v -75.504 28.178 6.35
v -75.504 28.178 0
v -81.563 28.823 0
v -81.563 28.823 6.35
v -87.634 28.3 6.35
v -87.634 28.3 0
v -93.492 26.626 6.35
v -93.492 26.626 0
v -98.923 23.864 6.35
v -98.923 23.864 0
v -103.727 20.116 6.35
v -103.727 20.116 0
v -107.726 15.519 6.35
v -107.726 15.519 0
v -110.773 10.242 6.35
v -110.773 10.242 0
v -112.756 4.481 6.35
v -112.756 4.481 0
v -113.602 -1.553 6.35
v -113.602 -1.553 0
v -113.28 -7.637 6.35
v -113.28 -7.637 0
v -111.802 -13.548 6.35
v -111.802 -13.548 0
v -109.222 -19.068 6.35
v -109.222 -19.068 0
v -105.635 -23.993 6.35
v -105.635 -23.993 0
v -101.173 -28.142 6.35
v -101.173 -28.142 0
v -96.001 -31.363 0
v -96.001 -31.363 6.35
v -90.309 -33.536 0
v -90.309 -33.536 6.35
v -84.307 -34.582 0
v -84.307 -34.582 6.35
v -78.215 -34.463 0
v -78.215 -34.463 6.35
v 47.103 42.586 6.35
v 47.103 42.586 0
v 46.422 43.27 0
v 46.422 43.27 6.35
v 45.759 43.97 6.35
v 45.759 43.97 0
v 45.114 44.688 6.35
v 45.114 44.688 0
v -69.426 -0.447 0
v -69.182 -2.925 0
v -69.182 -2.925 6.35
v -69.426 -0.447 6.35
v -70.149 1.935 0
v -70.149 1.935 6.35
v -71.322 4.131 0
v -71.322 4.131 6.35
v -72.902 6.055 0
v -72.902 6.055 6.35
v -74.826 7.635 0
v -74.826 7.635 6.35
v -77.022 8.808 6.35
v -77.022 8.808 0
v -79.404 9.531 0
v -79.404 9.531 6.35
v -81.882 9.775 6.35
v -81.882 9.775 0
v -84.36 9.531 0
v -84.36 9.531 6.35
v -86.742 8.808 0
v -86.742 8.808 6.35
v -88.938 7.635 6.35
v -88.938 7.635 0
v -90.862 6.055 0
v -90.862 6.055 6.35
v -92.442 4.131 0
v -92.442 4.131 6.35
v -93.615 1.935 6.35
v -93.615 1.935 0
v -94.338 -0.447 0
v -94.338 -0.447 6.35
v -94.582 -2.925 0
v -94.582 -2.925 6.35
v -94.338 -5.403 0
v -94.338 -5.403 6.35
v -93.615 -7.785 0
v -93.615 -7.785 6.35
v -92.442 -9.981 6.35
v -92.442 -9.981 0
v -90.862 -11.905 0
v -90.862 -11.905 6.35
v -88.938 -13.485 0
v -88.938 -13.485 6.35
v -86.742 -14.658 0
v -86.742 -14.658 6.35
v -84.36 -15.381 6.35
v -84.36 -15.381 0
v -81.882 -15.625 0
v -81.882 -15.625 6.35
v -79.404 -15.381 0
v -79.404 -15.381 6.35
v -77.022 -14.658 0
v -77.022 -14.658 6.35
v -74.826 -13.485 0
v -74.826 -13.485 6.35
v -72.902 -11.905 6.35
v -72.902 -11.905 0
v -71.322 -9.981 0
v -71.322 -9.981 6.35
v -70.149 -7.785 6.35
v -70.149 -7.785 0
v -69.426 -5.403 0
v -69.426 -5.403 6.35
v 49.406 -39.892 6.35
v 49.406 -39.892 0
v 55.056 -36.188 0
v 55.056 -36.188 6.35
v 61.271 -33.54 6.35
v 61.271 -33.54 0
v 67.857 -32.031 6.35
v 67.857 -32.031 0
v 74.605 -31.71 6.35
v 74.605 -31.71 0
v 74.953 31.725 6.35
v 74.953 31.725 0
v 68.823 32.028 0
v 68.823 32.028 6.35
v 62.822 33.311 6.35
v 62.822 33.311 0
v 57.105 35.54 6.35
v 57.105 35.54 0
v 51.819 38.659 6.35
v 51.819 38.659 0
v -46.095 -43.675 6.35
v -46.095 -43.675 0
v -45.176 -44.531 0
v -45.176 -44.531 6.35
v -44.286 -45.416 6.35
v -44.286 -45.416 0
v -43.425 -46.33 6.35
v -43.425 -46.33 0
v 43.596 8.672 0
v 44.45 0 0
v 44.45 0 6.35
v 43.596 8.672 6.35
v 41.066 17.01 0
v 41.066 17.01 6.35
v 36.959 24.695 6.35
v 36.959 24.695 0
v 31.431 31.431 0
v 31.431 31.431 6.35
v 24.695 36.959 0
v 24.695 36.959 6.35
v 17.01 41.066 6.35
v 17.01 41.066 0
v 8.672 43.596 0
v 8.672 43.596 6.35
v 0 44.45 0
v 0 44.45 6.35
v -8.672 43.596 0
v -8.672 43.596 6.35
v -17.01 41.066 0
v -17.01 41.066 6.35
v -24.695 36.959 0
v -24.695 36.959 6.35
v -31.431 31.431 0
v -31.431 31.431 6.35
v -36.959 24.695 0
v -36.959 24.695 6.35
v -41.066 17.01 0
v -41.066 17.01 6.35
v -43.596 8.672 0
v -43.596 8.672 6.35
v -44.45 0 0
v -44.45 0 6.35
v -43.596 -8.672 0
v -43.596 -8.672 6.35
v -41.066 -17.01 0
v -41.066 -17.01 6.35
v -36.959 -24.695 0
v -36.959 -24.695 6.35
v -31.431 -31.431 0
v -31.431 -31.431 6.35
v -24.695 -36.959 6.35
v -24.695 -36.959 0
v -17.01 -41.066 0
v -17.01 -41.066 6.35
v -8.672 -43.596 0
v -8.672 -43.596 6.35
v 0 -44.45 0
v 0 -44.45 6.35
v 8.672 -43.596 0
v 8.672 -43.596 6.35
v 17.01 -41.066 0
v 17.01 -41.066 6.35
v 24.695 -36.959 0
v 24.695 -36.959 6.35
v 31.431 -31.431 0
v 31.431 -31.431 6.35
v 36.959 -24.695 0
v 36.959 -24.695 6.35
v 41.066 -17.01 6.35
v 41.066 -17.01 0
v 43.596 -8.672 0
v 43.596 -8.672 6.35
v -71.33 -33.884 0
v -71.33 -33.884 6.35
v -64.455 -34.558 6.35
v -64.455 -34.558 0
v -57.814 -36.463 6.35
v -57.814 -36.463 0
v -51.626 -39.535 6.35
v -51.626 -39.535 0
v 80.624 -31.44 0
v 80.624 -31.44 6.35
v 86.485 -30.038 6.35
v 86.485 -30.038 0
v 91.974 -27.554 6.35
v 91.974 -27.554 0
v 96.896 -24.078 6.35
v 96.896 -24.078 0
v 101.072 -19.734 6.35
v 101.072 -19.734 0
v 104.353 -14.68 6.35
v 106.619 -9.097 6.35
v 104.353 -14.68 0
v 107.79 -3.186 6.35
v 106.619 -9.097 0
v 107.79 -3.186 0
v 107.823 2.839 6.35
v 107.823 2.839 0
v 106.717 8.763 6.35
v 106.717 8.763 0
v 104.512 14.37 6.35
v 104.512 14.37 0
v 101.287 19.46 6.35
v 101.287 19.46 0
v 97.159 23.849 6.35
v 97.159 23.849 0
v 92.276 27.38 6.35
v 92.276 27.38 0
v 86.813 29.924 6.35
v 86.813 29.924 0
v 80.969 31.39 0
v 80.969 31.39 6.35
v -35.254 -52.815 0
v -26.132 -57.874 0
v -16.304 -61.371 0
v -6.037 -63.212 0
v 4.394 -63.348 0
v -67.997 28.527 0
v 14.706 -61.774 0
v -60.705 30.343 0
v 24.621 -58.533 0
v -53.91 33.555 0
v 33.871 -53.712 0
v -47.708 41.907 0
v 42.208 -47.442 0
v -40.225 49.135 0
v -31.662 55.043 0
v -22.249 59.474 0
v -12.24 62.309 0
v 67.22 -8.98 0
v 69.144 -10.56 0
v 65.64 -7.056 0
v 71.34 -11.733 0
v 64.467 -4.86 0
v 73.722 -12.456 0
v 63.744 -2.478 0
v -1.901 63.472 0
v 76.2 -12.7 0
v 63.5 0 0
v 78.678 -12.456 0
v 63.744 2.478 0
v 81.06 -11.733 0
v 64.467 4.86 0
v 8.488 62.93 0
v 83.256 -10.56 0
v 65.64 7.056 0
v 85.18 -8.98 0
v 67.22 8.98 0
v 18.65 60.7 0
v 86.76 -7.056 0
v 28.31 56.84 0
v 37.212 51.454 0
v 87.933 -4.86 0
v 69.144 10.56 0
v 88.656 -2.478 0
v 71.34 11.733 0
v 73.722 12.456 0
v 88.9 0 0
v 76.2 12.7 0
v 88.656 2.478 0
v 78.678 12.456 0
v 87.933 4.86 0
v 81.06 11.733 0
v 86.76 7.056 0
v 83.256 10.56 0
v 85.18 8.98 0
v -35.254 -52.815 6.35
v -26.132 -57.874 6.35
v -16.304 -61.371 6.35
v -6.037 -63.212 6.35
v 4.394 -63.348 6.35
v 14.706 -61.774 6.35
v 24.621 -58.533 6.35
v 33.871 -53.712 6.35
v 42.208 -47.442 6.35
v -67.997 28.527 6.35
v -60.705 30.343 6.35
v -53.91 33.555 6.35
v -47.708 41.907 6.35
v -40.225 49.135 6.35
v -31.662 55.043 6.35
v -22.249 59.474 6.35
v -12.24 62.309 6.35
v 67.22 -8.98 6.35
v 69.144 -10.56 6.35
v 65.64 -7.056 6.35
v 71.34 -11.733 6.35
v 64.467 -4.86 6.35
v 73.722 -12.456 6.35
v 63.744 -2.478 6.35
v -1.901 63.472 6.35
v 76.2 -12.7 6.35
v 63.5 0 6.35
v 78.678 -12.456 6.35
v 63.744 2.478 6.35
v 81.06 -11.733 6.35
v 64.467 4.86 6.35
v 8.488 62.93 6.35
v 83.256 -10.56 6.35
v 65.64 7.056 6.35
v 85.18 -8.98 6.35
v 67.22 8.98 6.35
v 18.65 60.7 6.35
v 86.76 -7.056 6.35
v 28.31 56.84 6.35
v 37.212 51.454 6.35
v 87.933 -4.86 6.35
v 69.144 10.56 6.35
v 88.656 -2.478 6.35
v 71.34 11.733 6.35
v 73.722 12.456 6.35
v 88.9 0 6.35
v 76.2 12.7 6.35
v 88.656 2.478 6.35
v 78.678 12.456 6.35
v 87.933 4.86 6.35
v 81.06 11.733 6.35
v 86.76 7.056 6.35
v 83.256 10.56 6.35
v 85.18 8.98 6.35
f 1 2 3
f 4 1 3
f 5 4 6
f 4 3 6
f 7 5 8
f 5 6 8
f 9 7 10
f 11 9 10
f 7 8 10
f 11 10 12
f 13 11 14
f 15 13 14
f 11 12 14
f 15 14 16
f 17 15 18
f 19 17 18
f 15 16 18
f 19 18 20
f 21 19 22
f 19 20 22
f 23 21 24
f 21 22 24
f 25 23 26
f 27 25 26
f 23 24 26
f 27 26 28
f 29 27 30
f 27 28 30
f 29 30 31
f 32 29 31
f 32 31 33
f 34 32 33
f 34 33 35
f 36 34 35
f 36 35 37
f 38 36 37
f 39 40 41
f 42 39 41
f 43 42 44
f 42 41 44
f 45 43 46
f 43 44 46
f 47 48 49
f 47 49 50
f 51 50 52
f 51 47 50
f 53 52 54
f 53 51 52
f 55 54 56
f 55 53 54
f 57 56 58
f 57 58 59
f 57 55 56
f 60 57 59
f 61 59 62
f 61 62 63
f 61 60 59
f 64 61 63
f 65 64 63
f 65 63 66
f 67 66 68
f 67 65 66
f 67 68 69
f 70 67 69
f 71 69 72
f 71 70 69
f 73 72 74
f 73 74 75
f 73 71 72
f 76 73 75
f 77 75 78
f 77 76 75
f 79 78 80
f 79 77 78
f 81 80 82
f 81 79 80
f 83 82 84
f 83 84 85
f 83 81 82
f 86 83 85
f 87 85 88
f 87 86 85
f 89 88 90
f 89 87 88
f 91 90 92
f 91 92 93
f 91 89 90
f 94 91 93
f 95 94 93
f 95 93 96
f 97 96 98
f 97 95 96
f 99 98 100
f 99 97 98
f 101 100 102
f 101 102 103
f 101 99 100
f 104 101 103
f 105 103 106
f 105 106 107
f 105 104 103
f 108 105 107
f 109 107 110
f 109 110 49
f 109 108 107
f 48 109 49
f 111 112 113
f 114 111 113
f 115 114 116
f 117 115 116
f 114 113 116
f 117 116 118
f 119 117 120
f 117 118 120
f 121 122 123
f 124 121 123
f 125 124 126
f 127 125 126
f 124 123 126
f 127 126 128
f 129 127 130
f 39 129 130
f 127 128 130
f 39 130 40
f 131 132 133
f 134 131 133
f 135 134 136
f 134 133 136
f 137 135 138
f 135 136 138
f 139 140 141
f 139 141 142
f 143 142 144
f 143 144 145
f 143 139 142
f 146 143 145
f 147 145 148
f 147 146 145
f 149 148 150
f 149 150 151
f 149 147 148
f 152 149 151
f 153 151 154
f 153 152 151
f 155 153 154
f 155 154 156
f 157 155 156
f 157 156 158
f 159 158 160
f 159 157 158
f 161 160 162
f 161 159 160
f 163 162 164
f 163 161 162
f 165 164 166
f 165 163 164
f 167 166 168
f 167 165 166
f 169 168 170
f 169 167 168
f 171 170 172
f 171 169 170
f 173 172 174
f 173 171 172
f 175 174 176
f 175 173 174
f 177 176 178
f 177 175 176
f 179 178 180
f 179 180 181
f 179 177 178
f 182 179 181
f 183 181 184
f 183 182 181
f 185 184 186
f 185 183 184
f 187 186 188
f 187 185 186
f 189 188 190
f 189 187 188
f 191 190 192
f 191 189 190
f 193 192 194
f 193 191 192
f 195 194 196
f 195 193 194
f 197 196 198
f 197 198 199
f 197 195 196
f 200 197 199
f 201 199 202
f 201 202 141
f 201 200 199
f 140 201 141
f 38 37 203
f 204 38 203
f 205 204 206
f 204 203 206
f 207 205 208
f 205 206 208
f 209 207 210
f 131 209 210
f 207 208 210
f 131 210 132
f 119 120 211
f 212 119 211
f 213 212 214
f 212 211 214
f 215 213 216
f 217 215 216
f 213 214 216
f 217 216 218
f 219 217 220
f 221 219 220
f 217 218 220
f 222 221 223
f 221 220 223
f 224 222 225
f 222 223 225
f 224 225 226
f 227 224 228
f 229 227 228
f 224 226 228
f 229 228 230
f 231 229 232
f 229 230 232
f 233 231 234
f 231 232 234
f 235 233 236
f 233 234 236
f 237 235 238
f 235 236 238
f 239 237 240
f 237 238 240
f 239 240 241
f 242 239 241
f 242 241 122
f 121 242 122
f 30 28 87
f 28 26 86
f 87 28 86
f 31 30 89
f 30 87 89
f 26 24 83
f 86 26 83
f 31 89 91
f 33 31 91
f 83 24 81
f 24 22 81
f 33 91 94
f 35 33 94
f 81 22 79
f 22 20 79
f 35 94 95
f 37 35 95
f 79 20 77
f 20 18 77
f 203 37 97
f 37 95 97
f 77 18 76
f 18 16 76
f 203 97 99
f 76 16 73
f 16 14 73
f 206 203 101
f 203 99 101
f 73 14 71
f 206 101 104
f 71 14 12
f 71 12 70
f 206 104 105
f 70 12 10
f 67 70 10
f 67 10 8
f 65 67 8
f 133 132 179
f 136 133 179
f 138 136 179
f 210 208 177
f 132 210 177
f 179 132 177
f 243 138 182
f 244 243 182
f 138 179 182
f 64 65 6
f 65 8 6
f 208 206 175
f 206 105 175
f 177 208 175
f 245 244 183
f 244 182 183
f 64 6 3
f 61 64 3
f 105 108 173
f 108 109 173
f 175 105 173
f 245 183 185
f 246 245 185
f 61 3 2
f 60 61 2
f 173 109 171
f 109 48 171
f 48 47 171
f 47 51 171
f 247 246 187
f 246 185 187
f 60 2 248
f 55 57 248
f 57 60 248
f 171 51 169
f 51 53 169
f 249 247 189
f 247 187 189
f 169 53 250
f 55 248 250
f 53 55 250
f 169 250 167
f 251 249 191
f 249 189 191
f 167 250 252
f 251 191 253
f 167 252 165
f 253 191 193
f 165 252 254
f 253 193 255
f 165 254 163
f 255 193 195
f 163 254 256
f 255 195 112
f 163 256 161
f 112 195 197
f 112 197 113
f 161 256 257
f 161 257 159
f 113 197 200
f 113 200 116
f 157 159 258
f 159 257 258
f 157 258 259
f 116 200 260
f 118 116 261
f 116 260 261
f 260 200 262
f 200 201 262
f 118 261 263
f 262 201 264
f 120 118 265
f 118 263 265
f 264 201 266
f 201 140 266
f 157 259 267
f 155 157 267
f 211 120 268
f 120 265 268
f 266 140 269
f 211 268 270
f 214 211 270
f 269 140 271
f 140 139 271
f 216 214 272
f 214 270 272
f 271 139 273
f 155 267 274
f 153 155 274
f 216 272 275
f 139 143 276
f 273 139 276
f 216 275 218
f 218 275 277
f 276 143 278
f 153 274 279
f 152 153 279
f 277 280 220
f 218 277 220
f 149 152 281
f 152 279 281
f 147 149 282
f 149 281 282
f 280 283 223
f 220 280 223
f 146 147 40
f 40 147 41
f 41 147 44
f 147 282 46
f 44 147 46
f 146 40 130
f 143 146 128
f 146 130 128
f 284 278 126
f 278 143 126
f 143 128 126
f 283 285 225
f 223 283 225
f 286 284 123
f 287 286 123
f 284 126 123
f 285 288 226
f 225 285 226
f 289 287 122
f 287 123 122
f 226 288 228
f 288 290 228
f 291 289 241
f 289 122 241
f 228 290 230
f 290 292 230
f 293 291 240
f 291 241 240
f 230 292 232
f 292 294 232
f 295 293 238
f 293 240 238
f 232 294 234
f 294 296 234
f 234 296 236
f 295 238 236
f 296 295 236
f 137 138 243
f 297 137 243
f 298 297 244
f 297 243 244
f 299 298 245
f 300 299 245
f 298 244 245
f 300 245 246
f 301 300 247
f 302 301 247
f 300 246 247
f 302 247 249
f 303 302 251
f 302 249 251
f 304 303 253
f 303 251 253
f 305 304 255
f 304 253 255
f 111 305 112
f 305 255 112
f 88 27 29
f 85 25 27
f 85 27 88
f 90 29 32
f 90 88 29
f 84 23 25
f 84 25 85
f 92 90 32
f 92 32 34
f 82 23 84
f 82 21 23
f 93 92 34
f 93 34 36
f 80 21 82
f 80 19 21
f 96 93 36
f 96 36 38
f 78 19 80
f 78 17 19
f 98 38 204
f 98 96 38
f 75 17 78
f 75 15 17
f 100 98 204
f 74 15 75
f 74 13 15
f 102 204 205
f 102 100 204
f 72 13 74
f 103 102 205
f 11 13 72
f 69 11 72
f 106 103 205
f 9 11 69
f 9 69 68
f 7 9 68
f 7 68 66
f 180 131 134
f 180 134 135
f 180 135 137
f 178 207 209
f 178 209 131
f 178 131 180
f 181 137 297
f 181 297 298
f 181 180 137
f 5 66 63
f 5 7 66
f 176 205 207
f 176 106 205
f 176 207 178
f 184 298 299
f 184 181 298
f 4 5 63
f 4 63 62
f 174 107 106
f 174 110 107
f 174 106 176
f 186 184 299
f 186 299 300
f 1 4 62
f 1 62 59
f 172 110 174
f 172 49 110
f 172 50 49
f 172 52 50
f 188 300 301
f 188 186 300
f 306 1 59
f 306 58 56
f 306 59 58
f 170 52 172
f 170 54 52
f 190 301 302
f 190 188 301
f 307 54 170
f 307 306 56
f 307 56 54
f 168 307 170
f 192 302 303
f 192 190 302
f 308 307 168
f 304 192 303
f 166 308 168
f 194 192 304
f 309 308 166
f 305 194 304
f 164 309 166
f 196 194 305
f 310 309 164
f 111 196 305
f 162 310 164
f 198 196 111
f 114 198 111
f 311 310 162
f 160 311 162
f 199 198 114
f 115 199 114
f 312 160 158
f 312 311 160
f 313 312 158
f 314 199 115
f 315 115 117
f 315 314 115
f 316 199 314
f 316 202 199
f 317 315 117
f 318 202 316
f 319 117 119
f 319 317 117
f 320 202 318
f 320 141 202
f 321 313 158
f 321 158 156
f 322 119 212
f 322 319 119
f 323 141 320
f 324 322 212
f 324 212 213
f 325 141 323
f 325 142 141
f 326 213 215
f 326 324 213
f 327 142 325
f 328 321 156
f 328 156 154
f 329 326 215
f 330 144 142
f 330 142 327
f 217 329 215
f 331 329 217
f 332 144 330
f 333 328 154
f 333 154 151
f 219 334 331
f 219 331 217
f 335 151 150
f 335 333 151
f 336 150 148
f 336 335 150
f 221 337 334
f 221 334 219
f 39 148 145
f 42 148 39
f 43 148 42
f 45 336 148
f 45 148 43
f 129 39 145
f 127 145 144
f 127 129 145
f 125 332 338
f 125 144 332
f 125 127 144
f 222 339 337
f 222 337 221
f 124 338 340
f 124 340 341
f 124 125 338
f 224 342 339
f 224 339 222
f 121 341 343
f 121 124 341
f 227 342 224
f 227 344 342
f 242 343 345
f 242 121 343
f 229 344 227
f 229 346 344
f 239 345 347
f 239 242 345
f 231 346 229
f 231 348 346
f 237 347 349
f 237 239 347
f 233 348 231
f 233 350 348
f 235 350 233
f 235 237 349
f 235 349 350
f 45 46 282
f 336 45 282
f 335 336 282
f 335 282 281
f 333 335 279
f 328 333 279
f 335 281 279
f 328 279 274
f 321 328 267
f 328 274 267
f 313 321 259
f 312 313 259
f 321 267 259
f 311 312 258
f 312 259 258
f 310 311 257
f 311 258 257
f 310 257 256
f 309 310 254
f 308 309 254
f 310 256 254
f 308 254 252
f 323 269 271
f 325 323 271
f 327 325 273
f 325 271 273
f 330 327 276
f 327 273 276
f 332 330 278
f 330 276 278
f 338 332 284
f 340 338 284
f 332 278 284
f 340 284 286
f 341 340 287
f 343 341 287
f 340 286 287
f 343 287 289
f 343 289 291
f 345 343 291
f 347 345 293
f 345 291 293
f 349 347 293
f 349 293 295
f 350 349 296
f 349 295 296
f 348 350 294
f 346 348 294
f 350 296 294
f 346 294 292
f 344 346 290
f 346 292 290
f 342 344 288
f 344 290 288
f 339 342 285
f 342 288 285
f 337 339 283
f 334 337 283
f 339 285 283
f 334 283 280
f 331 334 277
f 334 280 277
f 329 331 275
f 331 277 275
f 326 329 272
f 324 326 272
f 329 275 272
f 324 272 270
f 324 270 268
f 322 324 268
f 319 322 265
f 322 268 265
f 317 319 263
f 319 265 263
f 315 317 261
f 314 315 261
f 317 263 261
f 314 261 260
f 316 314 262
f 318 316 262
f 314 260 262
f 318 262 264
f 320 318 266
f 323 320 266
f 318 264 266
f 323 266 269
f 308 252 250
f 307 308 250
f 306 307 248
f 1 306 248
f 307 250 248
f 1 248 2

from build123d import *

# Parameters (mm, degrees)
F0_R     = 12.7
F0_R_2   = 44.45
F1_DEPTH = 6.35


with BuildPart() as f1:
    # F0 (on Top) → F1 (new body)
    with BuildSketch(Plane.XY):
        with BuildLine():
            ThreePointArc((-78.214847, -34.462572), (-61.091134, -35.359671), (-46.095031, -43.674914))
            ThreePointArc((-46.095031, -43.674914), (-44.727285, -44.969636), (-43.42519, -46.330367))
            ThreePointArc((-43.42519, -46.330367), (4.393779, -63.347807), (49.405516, -39.891665))
            ThreePointArc((49.405516, -39.891665), (61.271133, -33.539825), (74.60493, -31.709908))
            ThreePointArc((74.60493, -31.709908), (107.949523, -0.174093), (74.952768, 31.725493))
            ThreePointArc((74.952768, 31.725493), (59.918318, 34.310355), (47.103013, 42.585869))
            ThreePointArc((47.103013, 42.585869), (46.088419, 43.617938), (45.113755, 44.687796))
            ThreePointArc((45.113755, 44.687796), (-7.094296, 63.102464), (-53.910206, 33.555024))
            ThreePointArc((-53.910206, 33.555024), (-64.305996, 29.254689), (-75.504467, 28.177844))
            ThreePointArc((-75.504467, 28.177844), (-113.602257, -1.552553), (-78.214847, -34.462572))
        make_face()
        with Locations((-81.881937, -2.925055)):
            Circle(F0_R, mode=Mode.SUBTRACT)
        Circle(F0_R_2, mode=Mode.SUBTRACT)
        with BuildLine():
            ThreePointArc((88.9, 0), (76.2, -12.7), (63.5, 0))
            ThreePointArc((63.5, 0), (76.2, 12.7), (88.9, 0))
        make_face(mode=Mode.SUBTRACT)
    extrude(amount=F1_DEPTH)


solid = f1.part
